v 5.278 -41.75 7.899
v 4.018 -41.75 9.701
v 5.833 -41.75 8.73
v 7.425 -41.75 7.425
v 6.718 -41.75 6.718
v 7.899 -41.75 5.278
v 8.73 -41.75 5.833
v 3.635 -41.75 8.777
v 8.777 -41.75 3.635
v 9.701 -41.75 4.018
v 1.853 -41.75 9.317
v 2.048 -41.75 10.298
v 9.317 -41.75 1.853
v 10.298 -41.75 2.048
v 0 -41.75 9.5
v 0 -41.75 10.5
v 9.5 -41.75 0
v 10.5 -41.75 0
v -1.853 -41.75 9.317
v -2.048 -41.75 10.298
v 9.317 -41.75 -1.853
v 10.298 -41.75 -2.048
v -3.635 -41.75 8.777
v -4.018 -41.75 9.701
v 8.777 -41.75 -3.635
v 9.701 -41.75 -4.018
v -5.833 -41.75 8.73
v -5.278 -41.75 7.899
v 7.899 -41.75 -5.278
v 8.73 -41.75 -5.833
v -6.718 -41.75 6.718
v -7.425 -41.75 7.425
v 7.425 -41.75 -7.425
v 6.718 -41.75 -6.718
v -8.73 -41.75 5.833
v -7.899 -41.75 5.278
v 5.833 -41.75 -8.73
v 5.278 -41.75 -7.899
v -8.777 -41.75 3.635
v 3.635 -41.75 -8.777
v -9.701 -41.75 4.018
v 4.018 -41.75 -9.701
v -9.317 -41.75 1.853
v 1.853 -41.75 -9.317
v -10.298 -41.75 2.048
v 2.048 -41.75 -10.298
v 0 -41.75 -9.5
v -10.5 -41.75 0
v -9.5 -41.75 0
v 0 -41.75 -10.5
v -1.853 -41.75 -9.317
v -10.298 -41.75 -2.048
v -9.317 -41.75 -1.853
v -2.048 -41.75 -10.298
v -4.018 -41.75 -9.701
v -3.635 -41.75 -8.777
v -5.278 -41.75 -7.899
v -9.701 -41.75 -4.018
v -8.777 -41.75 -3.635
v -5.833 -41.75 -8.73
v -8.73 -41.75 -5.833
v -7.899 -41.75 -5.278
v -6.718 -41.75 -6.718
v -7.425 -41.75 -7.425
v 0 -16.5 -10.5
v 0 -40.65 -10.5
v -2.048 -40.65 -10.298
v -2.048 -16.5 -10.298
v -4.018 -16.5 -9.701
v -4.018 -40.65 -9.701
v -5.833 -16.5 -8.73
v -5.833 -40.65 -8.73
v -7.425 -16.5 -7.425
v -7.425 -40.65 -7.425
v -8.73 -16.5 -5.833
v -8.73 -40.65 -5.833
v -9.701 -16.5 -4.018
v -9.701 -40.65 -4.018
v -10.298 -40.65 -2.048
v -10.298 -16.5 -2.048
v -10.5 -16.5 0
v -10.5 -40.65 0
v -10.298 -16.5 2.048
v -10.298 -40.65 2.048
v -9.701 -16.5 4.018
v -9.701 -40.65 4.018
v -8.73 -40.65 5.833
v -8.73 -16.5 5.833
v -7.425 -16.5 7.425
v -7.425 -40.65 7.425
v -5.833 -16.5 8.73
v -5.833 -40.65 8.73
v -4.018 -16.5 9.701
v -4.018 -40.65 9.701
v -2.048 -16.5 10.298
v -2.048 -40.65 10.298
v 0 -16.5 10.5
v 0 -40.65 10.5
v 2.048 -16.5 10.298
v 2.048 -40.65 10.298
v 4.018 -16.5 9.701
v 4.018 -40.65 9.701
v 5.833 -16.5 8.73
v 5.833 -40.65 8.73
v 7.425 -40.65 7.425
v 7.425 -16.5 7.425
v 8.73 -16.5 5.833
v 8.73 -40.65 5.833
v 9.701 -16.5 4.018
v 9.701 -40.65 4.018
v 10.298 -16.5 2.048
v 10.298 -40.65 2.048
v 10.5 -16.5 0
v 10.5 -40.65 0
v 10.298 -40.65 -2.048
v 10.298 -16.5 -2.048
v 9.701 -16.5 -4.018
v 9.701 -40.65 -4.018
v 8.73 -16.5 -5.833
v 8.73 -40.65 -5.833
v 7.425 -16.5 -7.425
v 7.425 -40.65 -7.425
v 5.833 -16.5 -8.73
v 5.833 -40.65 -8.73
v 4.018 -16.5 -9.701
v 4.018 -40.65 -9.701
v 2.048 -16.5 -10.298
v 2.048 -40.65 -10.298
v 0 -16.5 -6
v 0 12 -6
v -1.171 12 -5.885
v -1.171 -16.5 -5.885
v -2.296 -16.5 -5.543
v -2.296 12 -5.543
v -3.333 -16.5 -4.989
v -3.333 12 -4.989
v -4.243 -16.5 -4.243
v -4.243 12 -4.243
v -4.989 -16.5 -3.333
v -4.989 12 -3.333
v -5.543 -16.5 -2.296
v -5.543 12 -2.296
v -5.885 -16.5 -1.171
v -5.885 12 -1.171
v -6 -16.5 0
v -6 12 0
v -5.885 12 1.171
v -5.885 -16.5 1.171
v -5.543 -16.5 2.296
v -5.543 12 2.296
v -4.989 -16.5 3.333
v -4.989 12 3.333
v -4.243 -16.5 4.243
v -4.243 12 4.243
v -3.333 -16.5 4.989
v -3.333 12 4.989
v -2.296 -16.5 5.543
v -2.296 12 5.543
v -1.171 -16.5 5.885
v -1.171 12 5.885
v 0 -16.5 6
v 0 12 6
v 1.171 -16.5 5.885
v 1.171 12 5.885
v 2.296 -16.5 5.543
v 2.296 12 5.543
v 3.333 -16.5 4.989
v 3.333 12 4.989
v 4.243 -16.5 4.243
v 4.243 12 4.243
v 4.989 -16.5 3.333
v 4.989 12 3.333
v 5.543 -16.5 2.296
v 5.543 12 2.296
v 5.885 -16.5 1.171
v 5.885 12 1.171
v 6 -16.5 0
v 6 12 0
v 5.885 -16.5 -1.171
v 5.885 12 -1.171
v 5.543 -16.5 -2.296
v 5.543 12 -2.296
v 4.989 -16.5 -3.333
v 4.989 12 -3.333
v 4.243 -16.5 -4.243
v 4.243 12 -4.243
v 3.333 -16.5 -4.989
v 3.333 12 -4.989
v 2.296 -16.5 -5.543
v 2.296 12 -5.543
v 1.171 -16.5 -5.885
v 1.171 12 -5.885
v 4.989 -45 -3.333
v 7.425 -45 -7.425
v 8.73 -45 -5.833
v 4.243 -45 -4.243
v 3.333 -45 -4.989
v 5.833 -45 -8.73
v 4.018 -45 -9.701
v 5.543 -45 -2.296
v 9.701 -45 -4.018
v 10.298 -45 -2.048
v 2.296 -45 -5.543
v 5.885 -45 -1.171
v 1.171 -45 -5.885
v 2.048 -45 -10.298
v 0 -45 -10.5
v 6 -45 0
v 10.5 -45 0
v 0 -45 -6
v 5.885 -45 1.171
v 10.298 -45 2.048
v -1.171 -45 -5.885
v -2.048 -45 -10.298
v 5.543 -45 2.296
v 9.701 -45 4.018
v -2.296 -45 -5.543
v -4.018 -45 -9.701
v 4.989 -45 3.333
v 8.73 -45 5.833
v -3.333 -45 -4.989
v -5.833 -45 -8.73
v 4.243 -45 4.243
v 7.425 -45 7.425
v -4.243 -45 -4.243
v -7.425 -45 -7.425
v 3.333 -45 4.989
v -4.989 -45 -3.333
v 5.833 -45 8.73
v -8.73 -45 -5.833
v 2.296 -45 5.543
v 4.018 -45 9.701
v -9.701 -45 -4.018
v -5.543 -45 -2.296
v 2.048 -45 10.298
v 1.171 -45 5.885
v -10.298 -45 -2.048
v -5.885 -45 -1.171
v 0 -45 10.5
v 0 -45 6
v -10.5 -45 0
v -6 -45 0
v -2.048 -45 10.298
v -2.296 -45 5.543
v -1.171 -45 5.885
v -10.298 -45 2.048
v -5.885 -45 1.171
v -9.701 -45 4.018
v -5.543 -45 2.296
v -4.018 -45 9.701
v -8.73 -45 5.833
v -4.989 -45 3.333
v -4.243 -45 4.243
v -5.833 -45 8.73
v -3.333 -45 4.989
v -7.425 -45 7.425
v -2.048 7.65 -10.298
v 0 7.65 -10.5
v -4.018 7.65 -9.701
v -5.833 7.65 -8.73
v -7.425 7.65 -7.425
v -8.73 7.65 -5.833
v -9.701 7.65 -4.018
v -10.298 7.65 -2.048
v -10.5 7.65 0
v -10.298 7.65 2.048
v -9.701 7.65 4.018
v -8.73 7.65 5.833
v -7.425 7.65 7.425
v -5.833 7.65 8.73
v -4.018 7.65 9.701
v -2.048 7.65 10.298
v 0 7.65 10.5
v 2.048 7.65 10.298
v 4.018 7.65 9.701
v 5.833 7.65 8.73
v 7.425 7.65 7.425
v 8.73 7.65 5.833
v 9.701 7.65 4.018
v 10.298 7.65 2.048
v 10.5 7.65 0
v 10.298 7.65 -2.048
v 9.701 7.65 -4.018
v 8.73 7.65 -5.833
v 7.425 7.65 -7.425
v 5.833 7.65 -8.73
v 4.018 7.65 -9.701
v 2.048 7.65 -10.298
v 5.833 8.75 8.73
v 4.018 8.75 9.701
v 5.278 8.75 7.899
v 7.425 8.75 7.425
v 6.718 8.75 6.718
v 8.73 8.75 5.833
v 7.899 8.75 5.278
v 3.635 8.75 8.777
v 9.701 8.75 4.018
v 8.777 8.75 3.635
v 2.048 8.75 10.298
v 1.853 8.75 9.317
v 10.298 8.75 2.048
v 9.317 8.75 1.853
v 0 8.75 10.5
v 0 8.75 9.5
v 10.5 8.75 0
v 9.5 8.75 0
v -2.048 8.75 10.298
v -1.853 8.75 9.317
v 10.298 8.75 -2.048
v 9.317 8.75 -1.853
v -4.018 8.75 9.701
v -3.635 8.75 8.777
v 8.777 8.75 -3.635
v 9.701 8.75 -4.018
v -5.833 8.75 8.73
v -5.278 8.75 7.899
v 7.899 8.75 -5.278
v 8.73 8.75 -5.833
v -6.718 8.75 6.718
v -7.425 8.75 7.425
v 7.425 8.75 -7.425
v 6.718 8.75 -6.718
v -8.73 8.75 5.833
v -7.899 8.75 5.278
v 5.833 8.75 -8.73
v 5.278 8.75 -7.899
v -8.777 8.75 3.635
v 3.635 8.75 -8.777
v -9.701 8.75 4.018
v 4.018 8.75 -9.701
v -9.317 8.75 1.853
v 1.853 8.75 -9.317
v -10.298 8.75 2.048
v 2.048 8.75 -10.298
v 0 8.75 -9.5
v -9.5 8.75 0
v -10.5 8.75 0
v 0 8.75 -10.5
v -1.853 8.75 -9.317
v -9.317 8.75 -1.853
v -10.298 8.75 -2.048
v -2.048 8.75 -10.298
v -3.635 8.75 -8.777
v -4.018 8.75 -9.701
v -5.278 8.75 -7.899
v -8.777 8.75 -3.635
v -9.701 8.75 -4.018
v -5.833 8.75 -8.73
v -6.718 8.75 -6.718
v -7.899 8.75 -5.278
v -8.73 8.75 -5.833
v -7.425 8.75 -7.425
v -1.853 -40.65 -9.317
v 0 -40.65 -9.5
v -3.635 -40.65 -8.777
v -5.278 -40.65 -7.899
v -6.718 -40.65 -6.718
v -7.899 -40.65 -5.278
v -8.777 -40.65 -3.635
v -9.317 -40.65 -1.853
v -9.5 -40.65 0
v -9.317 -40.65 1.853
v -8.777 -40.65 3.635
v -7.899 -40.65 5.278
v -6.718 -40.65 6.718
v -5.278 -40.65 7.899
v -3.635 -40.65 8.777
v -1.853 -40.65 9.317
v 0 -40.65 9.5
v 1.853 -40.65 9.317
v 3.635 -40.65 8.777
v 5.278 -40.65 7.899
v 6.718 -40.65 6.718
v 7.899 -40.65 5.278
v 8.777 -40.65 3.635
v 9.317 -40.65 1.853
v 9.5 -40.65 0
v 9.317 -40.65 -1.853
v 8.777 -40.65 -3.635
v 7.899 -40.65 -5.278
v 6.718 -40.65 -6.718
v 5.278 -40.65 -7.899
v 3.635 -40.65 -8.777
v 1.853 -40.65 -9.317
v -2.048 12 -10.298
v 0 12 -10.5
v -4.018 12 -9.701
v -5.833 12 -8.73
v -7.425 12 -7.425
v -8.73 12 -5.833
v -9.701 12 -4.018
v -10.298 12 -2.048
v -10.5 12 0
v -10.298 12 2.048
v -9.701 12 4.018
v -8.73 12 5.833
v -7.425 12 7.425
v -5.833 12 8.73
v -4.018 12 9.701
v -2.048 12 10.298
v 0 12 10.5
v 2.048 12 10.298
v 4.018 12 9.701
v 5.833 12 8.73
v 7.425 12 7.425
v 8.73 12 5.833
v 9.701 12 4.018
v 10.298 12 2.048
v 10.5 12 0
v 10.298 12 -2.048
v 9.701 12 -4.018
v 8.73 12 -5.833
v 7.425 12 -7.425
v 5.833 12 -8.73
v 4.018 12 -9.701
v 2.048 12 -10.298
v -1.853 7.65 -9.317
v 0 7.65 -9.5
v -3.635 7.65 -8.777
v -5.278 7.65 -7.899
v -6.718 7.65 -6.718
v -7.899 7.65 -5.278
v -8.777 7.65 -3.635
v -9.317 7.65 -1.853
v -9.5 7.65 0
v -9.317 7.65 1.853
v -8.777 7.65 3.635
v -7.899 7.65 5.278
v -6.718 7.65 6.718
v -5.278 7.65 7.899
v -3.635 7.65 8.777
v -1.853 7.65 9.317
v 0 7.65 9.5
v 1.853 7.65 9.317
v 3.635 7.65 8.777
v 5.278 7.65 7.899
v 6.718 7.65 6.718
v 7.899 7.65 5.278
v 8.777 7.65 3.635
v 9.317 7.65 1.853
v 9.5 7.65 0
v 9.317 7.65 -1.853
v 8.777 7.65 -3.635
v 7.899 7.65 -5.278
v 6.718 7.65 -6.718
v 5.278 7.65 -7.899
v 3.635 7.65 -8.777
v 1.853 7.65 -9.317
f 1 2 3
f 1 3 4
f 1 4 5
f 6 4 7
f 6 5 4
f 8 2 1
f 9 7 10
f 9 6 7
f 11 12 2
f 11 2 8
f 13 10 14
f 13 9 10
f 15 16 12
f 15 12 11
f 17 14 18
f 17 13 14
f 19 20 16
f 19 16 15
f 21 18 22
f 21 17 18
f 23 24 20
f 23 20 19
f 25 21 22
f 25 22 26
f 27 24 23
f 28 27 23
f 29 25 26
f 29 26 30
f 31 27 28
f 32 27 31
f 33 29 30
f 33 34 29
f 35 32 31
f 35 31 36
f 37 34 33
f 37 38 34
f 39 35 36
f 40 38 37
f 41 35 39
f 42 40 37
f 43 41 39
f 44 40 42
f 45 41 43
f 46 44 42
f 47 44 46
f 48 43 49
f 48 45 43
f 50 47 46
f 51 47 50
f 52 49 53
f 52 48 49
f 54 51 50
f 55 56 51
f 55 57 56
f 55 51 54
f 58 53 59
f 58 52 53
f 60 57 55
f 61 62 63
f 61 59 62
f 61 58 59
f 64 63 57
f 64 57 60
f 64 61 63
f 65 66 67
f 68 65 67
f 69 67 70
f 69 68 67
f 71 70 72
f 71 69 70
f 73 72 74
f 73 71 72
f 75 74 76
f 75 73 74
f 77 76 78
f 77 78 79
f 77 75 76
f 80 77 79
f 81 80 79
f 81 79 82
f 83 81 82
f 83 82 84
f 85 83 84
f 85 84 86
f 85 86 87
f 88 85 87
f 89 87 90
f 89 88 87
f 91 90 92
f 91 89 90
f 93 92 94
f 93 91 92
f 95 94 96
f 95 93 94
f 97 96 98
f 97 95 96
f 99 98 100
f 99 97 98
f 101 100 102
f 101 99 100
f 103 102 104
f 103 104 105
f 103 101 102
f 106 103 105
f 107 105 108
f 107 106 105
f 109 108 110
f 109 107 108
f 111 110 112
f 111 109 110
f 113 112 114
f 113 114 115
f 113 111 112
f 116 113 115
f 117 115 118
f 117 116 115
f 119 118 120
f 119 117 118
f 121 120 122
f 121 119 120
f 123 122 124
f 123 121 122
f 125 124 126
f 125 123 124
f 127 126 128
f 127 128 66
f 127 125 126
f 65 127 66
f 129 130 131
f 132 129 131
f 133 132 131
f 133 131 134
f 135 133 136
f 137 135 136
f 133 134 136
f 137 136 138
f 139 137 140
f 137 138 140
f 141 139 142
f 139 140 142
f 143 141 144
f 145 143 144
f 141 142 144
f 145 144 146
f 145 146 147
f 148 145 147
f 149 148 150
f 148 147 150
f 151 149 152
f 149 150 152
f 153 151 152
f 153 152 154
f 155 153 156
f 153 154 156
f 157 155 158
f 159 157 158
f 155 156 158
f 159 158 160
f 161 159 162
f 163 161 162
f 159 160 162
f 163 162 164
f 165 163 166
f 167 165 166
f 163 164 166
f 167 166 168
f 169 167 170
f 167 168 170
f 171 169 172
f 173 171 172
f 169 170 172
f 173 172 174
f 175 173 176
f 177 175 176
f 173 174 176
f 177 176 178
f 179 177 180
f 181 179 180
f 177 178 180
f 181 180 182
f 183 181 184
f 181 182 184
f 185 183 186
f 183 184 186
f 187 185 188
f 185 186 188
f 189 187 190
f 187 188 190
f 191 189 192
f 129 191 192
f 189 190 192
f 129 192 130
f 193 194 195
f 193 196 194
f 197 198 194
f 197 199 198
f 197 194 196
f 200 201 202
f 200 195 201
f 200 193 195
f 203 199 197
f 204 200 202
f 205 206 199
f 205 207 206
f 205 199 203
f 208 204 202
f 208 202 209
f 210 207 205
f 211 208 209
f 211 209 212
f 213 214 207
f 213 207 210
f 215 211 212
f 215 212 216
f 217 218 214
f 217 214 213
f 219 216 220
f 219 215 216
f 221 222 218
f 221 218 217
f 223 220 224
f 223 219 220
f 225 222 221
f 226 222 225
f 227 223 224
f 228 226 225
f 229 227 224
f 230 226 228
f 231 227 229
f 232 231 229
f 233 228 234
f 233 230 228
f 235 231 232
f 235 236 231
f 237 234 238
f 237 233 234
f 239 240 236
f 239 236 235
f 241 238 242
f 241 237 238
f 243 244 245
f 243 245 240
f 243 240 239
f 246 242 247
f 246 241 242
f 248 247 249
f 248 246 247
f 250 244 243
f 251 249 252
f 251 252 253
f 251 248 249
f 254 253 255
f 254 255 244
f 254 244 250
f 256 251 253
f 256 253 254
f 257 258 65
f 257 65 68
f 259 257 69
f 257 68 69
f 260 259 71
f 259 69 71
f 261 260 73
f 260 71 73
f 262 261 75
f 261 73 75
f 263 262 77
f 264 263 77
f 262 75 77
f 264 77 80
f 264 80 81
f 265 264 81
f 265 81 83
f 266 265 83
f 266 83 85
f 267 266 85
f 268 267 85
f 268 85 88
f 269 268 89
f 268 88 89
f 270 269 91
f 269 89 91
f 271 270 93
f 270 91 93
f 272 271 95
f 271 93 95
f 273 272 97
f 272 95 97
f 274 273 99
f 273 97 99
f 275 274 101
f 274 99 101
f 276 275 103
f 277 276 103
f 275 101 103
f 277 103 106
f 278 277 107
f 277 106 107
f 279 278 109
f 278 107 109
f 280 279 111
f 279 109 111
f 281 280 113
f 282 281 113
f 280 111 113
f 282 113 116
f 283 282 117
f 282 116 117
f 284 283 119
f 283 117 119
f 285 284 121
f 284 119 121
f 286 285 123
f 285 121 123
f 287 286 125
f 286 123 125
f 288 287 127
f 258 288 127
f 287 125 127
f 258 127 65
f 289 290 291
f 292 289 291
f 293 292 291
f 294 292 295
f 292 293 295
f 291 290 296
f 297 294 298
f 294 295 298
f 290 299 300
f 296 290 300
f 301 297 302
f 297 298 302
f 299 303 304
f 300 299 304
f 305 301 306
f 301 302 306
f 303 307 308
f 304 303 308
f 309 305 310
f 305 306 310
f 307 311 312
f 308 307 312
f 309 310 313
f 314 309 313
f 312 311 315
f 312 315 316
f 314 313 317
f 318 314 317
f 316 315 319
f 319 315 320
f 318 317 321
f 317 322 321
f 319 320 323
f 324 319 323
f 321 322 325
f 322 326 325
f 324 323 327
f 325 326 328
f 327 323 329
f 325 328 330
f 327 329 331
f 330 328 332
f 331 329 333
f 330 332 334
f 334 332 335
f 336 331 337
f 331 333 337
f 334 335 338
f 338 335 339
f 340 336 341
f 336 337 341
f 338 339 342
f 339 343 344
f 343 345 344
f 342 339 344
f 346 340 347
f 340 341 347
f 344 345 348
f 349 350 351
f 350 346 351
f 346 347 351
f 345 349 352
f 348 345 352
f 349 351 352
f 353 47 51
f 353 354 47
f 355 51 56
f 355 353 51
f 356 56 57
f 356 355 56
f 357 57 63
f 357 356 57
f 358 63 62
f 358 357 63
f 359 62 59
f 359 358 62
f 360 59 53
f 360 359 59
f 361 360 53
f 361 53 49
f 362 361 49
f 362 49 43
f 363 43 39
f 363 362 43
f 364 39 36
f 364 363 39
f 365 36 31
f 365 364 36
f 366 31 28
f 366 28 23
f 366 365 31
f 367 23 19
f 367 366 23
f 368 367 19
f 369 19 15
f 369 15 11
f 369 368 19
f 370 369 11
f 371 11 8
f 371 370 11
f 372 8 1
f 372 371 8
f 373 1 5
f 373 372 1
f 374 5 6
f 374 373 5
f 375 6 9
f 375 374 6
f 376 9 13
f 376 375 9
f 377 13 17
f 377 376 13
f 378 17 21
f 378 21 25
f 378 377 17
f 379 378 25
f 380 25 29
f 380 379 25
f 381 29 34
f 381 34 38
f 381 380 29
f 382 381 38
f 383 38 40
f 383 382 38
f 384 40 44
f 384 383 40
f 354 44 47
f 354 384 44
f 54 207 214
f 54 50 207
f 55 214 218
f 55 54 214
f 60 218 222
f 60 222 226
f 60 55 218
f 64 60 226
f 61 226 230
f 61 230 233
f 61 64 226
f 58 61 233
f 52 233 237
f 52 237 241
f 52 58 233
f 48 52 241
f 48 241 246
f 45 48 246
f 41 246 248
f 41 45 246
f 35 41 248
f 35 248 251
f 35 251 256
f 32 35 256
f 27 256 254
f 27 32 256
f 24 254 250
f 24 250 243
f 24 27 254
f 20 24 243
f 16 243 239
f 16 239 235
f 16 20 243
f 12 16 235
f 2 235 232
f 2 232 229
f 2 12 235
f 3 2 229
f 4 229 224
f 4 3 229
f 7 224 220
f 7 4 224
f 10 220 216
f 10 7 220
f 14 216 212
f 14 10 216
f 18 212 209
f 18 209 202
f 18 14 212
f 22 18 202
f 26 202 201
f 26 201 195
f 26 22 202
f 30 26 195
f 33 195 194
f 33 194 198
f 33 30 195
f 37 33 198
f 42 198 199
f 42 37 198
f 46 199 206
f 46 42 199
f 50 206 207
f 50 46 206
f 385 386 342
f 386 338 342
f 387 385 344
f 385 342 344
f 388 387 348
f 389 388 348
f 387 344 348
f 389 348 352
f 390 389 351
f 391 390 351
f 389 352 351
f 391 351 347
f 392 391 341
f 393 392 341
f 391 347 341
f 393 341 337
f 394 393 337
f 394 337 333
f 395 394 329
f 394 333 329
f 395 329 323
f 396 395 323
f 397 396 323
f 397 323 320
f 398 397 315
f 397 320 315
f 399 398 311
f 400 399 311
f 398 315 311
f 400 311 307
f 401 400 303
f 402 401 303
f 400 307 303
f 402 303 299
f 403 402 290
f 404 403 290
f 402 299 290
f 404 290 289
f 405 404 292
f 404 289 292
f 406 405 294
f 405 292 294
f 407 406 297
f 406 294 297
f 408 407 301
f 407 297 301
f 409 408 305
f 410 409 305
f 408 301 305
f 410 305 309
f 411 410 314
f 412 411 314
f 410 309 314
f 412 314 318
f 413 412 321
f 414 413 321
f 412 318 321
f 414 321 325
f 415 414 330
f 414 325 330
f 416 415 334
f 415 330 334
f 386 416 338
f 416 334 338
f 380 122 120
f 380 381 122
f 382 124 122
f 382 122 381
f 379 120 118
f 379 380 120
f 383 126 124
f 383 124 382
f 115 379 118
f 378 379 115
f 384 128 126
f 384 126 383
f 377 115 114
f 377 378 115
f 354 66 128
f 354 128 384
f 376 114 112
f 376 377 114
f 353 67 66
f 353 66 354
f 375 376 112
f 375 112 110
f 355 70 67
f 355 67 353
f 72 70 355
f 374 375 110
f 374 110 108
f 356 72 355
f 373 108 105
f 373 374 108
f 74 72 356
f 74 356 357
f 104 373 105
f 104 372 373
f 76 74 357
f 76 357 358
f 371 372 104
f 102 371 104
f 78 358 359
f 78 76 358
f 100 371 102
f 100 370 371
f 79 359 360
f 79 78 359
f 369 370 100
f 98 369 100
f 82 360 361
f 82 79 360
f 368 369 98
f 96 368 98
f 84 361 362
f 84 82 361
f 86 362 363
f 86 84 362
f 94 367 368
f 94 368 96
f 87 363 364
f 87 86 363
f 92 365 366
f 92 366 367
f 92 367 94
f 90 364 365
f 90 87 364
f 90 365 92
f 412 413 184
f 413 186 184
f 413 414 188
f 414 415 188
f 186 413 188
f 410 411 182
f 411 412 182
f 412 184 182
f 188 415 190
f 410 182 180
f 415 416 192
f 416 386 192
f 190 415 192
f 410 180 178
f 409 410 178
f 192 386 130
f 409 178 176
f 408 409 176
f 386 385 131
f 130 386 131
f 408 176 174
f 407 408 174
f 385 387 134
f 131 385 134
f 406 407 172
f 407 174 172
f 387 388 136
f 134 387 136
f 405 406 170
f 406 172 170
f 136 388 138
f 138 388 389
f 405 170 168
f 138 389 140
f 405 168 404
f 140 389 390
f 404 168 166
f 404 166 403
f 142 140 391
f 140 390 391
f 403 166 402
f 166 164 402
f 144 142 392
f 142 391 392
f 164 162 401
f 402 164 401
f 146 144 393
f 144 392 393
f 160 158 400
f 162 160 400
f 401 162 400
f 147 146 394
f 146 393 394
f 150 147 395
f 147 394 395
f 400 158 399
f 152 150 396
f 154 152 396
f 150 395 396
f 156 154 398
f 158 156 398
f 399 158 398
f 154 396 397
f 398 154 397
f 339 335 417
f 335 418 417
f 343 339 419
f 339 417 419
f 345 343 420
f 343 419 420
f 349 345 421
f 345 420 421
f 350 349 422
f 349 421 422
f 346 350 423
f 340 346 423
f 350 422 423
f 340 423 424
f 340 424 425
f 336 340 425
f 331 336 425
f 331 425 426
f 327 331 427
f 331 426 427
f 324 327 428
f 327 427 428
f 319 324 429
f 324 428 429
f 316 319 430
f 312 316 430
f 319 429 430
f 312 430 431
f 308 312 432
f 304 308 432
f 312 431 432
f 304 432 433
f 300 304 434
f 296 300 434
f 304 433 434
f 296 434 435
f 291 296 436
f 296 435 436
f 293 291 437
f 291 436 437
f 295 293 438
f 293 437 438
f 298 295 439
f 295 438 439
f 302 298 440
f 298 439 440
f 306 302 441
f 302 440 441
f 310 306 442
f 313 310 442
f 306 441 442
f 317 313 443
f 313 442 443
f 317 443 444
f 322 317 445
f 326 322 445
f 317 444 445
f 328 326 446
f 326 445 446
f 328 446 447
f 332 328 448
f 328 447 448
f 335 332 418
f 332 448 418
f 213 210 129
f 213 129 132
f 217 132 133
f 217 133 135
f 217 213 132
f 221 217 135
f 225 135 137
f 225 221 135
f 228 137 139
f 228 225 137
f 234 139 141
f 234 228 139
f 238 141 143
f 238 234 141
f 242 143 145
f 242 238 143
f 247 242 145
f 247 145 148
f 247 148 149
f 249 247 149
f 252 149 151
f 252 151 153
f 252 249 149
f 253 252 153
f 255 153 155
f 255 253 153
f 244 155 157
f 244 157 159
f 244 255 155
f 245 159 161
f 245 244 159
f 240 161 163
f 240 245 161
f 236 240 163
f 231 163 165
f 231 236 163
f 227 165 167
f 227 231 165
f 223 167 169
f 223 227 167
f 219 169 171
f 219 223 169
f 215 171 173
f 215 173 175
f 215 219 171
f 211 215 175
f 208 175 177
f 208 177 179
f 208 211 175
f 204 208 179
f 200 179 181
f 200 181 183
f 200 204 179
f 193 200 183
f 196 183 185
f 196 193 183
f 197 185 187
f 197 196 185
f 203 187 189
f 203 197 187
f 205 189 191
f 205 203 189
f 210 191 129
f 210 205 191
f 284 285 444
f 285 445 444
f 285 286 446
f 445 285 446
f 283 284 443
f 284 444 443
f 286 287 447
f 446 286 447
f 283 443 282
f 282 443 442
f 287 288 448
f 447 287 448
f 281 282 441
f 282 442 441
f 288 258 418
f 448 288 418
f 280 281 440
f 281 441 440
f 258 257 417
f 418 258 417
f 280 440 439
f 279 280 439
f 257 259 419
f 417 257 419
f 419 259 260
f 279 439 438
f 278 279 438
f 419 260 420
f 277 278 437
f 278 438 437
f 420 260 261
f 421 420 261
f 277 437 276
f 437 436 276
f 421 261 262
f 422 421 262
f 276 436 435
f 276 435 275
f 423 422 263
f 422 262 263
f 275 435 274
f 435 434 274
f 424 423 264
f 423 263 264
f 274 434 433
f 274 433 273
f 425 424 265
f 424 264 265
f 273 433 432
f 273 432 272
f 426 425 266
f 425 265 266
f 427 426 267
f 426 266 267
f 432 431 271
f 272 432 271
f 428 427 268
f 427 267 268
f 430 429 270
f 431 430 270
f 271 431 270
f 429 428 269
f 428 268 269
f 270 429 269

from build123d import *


with BuildPart() as part:
    # Sketch1 → Revolve1 (revolve)
    with BuildSketch(Plane.XY, mode=Mode.PRIVATE) as revolve1_sk:
        Polygon((6, -16.5), (6, 12), (10.5, 12), (10.5, 8.75), (9.5, 8.75), (9.5, 7.65), (10.5, 7.65), (10.5, -16.5), align=None)
    revolve1 = revolve(revolve1_sk.sketch.rotate(Axis((0, 0, 0), (0, 1, 0)), 90), axis=Axis((0, 0, 0), (0, 1, 0)))

    # Mirror1: Revolve1 across plane
    add(revolve1.mirror(Plane(origin=(6, -16.5, 0), x_dir=(0, 0, 1), z_dir=(0, -1, 0))))


solid = part.part
